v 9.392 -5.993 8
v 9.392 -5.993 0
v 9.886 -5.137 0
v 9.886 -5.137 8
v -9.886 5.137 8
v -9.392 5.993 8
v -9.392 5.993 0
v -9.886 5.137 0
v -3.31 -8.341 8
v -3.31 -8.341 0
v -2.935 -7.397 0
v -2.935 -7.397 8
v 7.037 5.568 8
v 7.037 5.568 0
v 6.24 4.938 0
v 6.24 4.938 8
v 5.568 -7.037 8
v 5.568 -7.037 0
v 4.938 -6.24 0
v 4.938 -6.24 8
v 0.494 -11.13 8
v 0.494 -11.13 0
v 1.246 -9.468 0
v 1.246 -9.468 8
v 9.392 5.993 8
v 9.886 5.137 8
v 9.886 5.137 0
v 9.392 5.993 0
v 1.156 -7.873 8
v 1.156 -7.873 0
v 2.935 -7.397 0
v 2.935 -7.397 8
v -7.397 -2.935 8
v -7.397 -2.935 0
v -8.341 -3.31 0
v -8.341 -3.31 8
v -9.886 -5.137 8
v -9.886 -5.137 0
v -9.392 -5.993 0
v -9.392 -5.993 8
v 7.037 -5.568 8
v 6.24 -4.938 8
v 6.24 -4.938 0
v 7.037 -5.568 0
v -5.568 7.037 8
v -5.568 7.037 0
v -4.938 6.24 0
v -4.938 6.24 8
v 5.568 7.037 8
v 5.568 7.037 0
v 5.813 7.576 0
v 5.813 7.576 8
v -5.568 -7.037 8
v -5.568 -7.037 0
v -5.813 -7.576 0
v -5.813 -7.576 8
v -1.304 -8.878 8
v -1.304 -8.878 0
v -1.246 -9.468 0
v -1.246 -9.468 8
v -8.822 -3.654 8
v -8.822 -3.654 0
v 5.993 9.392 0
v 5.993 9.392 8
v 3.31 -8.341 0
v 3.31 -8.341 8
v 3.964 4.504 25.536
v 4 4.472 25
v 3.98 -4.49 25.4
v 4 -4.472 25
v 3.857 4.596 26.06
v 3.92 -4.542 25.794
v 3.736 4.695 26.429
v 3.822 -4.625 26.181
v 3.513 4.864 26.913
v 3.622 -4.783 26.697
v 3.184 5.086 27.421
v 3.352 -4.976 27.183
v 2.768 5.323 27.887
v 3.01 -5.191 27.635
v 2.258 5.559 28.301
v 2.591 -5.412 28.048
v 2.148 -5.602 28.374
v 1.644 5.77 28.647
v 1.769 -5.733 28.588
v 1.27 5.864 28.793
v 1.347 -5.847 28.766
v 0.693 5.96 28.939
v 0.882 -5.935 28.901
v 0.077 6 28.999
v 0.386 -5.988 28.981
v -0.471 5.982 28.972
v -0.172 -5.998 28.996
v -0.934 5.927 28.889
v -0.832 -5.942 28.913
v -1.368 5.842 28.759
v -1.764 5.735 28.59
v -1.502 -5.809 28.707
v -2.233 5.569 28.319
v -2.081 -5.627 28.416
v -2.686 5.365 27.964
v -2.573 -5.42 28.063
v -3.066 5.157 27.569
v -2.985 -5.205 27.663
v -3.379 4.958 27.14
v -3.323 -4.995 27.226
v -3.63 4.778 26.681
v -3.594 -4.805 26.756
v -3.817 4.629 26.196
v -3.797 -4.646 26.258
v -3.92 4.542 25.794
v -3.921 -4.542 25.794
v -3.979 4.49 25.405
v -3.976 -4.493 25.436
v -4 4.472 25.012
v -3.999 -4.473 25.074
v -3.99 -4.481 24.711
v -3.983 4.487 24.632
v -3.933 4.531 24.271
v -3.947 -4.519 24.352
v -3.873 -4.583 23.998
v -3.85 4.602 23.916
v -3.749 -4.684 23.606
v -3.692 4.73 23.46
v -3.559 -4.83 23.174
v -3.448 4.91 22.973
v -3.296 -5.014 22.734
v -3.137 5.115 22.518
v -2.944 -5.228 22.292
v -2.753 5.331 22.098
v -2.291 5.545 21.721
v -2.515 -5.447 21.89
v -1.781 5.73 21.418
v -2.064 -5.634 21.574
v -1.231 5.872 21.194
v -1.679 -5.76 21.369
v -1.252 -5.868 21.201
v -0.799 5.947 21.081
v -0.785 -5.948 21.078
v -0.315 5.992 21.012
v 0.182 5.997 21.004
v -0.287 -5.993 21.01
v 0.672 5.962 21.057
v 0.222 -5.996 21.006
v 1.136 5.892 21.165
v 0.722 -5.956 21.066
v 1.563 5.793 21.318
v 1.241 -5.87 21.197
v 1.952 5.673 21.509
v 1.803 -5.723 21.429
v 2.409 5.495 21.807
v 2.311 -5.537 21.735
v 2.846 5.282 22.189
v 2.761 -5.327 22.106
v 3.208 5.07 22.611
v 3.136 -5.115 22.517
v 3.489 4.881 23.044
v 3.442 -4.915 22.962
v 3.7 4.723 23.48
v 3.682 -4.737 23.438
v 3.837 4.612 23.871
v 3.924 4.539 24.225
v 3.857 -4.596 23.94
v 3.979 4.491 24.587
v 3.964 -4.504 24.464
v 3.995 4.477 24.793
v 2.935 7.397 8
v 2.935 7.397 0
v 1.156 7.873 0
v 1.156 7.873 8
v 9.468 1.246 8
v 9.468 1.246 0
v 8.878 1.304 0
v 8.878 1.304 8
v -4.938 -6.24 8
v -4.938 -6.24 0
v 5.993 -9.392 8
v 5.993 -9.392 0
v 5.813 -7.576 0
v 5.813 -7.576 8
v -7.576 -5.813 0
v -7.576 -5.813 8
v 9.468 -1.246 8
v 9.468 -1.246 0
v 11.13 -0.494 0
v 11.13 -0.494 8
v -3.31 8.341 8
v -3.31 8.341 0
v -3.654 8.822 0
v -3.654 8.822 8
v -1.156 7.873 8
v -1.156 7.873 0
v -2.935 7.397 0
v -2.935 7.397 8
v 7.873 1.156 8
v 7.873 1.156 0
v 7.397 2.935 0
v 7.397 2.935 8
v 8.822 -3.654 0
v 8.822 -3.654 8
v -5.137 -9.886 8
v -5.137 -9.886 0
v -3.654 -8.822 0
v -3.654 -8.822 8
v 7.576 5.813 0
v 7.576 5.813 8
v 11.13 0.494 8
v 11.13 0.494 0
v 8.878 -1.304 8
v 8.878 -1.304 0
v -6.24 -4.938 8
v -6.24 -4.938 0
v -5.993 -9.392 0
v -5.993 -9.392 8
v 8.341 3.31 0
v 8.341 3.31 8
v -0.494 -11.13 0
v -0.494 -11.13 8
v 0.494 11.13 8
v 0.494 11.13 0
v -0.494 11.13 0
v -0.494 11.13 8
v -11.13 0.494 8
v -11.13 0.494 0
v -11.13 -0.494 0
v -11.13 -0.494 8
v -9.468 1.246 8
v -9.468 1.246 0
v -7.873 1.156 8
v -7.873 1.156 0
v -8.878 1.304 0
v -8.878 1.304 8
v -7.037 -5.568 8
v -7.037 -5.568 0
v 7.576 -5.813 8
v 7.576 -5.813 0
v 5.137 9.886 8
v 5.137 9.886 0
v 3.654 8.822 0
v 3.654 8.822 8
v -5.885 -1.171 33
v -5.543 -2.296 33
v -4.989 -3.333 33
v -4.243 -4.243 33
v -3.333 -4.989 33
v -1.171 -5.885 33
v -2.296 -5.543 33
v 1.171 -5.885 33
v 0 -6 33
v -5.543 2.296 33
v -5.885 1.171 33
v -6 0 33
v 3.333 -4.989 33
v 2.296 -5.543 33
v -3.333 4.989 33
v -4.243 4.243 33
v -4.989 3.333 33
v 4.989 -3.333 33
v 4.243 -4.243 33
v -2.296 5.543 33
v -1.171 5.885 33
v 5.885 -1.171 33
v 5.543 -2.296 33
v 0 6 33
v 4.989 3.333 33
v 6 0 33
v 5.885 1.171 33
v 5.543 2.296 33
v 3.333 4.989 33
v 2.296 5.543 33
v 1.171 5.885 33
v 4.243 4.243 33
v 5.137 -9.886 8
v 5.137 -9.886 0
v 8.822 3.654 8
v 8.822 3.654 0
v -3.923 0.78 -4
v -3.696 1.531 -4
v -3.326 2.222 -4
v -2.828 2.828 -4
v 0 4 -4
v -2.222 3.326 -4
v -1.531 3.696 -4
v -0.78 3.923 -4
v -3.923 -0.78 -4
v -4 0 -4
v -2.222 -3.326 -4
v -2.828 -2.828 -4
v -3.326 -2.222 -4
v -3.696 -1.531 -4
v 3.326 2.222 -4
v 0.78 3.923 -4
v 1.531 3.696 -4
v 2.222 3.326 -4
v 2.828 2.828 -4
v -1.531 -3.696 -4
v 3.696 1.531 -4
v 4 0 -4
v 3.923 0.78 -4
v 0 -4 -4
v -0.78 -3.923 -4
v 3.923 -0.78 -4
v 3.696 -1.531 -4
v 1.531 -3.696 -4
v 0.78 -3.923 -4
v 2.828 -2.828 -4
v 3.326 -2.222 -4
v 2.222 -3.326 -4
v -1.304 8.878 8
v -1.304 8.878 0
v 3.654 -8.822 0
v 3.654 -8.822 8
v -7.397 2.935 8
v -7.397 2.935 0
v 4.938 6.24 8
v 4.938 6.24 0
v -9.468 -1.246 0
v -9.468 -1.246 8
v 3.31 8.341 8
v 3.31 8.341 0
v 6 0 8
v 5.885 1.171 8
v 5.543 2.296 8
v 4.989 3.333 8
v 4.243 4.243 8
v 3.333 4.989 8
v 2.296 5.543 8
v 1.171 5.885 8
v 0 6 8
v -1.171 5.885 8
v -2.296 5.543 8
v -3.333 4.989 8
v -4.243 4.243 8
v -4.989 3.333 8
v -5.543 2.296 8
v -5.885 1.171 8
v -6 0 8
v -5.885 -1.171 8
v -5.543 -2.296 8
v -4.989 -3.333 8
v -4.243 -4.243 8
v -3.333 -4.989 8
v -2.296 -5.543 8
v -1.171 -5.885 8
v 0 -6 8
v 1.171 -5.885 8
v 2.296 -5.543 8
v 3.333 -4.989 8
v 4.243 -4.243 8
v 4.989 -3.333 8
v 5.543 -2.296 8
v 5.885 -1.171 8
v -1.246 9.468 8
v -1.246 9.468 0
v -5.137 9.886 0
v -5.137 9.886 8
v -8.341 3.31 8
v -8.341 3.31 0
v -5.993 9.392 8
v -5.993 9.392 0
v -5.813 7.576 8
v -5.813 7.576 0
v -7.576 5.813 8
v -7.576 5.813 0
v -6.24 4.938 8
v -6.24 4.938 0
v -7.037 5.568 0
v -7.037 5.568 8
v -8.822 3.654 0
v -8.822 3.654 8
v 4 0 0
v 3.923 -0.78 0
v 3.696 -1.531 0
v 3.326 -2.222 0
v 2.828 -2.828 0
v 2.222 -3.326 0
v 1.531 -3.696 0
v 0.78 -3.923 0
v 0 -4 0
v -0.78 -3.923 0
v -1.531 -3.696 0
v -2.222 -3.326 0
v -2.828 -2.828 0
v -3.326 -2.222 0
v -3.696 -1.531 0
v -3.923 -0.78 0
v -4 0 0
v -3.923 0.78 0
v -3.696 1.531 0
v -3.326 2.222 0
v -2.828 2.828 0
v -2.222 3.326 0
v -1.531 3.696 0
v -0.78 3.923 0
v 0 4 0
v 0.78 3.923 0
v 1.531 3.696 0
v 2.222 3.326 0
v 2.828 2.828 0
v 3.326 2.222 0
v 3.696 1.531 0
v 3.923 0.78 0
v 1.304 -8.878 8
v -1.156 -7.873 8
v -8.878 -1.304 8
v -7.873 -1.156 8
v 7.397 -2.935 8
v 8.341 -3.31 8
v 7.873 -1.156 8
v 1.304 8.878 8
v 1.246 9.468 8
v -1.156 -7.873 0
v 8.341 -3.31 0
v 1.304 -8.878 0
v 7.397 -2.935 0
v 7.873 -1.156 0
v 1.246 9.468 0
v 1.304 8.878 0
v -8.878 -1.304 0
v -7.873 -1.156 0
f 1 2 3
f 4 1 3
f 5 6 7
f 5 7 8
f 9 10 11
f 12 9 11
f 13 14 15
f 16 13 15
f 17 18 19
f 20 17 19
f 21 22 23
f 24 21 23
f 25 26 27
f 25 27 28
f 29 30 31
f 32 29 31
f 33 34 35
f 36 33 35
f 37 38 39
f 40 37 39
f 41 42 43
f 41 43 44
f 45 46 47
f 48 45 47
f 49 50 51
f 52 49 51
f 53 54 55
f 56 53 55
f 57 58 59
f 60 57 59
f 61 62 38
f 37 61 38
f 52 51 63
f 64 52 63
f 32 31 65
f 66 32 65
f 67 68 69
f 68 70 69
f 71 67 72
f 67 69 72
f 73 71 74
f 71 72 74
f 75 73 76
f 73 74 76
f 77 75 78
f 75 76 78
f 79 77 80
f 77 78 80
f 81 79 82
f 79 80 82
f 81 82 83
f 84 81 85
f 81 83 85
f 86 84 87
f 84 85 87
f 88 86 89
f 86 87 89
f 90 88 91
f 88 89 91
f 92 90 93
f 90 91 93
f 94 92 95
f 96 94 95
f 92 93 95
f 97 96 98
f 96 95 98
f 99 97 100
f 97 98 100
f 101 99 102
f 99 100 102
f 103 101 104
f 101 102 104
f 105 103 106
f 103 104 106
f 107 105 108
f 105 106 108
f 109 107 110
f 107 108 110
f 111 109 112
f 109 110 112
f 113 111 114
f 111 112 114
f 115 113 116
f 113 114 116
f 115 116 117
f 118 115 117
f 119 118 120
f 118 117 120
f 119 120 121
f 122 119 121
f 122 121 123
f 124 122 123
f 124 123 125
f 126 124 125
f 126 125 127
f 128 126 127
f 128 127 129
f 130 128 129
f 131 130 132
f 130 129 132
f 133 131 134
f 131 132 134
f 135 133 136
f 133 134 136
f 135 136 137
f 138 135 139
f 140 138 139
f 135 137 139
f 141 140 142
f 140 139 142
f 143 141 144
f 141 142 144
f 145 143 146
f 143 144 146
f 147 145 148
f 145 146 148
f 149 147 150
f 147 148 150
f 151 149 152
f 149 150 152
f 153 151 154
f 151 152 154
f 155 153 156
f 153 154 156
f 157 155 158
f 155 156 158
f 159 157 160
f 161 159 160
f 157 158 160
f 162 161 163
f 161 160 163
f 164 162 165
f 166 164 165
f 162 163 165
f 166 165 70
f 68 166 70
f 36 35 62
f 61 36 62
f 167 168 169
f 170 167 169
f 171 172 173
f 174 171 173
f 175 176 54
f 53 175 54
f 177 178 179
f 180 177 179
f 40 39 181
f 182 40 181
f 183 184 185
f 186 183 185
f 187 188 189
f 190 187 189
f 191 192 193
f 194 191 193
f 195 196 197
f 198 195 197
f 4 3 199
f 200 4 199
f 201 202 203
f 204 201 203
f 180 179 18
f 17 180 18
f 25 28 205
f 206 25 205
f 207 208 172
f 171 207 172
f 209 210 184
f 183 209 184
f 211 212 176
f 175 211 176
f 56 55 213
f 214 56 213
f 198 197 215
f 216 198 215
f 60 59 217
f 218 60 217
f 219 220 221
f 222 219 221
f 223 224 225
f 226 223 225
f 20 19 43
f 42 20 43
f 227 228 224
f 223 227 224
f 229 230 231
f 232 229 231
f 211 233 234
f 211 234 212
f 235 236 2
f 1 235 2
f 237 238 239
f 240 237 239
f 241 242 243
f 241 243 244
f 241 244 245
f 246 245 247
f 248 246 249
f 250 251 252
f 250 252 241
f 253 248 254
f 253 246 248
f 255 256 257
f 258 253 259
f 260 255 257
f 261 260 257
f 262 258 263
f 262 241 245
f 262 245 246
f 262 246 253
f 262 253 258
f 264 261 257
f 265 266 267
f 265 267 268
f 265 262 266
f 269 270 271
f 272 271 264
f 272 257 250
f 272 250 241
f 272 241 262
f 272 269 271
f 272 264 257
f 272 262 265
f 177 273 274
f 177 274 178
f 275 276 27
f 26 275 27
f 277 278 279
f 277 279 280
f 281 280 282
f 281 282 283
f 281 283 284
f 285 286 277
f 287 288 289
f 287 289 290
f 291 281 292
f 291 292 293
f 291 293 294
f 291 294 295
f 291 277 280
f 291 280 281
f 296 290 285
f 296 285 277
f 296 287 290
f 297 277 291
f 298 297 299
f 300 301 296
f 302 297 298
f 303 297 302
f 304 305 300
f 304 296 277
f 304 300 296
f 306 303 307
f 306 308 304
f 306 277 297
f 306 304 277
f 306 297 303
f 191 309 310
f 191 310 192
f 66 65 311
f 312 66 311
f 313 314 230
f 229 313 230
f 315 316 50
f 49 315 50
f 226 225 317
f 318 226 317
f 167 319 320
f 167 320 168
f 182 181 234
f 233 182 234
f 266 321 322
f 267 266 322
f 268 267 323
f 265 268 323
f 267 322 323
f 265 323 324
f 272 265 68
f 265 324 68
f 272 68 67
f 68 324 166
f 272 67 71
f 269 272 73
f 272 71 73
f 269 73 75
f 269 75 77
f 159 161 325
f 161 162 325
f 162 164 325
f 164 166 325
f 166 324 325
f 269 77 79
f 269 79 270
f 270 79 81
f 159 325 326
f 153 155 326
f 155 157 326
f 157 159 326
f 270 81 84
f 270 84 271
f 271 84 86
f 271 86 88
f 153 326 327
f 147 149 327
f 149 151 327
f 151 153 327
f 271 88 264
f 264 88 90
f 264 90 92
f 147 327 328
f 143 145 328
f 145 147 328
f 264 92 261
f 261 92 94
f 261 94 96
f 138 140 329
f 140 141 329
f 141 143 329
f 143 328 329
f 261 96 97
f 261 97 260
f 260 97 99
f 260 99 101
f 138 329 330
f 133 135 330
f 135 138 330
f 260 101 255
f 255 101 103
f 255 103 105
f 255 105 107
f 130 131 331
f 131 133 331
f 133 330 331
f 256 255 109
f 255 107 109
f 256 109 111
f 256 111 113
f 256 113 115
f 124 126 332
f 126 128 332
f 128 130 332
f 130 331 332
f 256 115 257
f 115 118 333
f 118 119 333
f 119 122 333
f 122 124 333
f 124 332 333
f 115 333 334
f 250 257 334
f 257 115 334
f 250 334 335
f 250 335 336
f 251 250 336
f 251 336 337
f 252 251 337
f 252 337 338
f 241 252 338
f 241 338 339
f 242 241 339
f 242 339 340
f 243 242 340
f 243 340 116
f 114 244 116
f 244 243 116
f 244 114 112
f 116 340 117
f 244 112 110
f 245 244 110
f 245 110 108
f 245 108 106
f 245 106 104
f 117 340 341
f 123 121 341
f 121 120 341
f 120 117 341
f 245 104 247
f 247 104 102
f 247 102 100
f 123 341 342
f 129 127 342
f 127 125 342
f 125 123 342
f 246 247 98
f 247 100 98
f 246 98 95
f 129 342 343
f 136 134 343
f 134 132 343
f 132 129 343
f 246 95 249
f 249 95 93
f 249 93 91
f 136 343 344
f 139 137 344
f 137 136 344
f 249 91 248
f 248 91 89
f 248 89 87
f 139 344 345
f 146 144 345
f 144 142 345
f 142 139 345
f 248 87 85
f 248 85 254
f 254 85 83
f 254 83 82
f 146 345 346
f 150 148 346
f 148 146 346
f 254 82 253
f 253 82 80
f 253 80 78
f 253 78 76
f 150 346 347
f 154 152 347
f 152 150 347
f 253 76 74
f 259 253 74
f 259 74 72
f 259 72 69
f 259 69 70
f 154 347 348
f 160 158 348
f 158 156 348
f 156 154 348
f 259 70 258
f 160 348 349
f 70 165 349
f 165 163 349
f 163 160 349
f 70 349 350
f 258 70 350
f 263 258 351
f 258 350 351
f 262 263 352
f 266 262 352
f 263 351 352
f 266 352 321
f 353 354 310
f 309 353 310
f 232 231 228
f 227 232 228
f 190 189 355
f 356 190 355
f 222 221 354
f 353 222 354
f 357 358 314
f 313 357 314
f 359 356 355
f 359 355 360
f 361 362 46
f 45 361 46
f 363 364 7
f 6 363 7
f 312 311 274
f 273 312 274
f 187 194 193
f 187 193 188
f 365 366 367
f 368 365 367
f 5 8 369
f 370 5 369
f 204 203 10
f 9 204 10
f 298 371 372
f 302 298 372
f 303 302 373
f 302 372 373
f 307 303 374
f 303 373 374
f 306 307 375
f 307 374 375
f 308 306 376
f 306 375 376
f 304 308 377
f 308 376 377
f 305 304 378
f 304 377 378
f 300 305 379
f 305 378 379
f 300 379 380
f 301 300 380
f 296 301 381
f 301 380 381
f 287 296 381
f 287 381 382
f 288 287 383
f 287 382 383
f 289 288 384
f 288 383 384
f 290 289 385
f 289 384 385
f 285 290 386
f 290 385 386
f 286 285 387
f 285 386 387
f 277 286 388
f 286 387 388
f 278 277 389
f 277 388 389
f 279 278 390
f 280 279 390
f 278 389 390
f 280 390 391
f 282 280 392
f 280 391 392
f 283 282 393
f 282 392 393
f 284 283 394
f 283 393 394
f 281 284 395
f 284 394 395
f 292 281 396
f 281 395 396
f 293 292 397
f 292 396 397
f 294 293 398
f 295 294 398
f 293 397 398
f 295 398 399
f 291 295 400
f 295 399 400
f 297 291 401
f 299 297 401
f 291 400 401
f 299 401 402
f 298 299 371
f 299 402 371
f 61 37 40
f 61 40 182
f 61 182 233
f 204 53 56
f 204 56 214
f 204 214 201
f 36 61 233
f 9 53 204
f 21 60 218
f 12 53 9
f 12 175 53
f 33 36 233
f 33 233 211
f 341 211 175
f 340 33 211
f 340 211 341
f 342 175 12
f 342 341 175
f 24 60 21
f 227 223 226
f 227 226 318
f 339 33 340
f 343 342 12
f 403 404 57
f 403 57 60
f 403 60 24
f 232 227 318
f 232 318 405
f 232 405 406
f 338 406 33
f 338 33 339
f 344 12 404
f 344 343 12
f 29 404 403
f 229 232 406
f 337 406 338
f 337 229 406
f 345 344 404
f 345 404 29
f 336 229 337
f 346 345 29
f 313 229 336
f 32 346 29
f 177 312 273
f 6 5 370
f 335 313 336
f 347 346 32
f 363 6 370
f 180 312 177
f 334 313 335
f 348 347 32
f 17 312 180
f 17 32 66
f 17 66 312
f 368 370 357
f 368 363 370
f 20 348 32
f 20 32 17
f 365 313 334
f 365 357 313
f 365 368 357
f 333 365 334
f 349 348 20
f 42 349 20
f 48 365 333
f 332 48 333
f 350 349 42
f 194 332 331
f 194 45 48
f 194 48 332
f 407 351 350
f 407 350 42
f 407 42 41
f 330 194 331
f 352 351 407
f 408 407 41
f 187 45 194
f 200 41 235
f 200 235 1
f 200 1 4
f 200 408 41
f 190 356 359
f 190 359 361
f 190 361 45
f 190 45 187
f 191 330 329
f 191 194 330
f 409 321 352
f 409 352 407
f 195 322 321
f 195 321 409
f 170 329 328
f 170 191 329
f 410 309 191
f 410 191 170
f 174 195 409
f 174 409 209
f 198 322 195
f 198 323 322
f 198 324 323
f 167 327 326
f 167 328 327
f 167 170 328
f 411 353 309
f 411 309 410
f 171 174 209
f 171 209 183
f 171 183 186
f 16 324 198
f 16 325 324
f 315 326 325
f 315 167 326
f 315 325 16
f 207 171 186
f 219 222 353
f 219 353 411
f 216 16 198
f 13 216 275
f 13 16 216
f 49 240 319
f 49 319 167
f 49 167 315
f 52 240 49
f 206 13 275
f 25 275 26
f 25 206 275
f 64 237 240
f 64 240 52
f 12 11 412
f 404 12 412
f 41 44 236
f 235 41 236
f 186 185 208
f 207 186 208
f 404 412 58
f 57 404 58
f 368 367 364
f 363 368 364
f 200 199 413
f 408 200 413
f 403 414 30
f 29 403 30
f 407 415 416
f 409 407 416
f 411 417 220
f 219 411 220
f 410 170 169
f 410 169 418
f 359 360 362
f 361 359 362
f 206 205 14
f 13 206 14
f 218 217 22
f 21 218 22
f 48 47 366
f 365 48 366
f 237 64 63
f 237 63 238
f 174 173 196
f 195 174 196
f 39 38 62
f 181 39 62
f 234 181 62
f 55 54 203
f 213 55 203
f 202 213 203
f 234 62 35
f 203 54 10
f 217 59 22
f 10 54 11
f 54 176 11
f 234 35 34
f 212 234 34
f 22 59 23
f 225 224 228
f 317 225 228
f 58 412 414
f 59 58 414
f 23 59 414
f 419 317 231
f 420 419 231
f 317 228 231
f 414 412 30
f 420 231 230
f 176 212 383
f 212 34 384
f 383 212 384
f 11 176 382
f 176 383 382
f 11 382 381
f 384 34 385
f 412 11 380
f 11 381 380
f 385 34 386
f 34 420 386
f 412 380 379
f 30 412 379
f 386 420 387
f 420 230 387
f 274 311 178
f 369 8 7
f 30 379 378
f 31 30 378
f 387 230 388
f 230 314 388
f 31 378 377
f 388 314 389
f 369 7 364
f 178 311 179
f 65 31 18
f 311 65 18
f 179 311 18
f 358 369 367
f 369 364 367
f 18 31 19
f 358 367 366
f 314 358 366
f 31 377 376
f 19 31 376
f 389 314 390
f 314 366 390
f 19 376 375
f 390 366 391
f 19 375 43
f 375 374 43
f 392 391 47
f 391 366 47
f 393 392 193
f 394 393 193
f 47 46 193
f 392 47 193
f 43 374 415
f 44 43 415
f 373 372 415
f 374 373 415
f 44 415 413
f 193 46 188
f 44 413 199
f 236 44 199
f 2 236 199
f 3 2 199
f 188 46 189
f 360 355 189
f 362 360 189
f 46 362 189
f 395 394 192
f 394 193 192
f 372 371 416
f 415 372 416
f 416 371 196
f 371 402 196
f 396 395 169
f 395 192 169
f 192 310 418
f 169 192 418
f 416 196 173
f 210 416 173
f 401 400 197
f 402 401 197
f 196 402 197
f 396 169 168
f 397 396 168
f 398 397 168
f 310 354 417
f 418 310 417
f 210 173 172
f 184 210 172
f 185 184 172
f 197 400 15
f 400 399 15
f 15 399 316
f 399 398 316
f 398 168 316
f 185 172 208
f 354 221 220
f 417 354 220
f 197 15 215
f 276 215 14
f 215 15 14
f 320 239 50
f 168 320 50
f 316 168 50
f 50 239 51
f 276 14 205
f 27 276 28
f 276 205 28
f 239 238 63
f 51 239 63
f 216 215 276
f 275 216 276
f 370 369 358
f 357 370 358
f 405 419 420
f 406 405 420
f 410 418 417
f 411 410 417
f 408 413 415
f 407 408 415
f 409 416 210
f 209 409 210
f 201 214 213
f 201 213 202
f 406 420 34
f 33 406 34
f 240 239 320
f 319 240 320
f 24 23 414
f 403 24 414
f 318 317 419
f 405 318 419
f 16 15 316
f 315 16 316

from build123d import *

# Parameters (mm, degrees)
F1_DEPTH = 8
F2_R     = 6
F3_DEPTH = 25
F4_R     = 4
F5_DEPTH = 4
F6_R     = 4
F7_DEPTH = 6


with BuildPart() as f1:
    # F0 (on Top) → F1 (new body)
    with BuildSketch(Plane.XY):
        Polygon((8.878189, 1.303729), (7.873311, 1.156166), (7.39657, 2.935387), (8.340604, 3.310035), (8.822399, 3.654358), (9.885736, 5.137187), (9.391802, 5.992704), (7.575968, 5.813244), (7.036875, 5.568157), (6.240405, 4.937924), (4.937924, 6.240405), (5.568157, 7.036876), (5.813244, 7.575967), (5.992704, 9.391803), (5.137187, 9.885737), (3.654357, 8.822399), (3.310035, 8.340604), (2.935388, 7.39657), (1.156166, 7.873311), (1.303728, 8.878189), (1.246434, 9.467602), (0.493934, 11.129891), (-0.493934, 11.129891), (-1.246434, 9.467602), (-1.303728, 8.878189), (-1.156166, 7.873311), (-2.935388, 7.39657), (-3.310035, 8.340604), (-3.654357, 8.822399), (-5.137187, 9.885737), (-5.992704, 9.391803), (-5.813244, 7.575967), (-5.568157, 7.036876), (-4.937924, 6.240405), (-6.240405, 4.937924), (-7.036875, 5.568157), (-7.575968, 5.813244), (-9.391802, 5.992704), (-9.885736, 5.137187), (-8.822399, 3.654358), (-8.340604, 3.310035), (-7.39657, 2.935387), (-7.873311, 1.156166), (-8.878189, 1.303729), (-9.467602, 1.246434), (-11.129891, 0.493934), (-11.129891, -0.493934), (-9.467602, -1.246434), (-8.878189, -1.303729), (-7.873311, -1.156165), (-7.39657, -2.935387), (-8.340604, -3.310035), (-8.822399, -3.654358), (-9.885736, -5.137186), (-9.391802, -5.992704), (-7.575968, -5.813244), (-7.036875, -5.568156), (-6.240405, -4.937924), (-4.937924, -6.240405), (-5.568157, -7.036876), (-5.813244, -7.575967), (-5.992704, -9.391803), (-5.137187, -9.885737), (-3.654357, -8.822399), (-3.310035, -8.340603), (-2.935388, -7.39657), (-1.156166, -7.873311), (-1.303728, -8.878188), (-1.246434, -9.467602), (-0.493934, -11.12989), (0.493934, -11.12989), (1.246434, -9.467602), (1.303728, -8.878188), (1.156166, -7.873311), (2.935388, -7.39657), (3.310035, -8.340603), (3.654357, -8.822399), (5.137187, -9.885737), (5.992704, -9.391803), (5.813244, -7.575967), (5.568157, -7.036876), (4.937924, -6.240405), (6.240405, -4.937924), (7.036875, -5.568156), (7.575968, -5.813244), (9.391802, -5.992704), (9.885736, -5.137186), (8.822399, -3.654358), (8.340604, -3.310035), (7.39657, -2.935387), (7.873311, -1.156165), (8.878189, -1.303729), (9.467602, -1.246434), (11.12989, -0.493934), (11.12989, 0.493934), (9.467602, 1.246434), align=None)
    extrude(amount=F1_DEPTH)

    # F2 (on face) → F3 (join)
    with BuildSketch(Plane.XY.offset(8)):
        Circle(F2_R)
    extrude(amount=F3_DEPTH)

    # F4 (on face) → F5 (join)
    with BuildSketch(Plane(origin=(0, 0, 0), x_dir=(1, 0, 0), z_dir=(0, 0, -1))):
        Circle(F4_R)
    extrude(amount=F5_DEPTH)

    # F6 (on Front) → F7 (cut, symmetric)
    with BuildSketch(Plane.XZ):
        with Locations((0, 25)):
            Circle(F6_R)
    extrude(amount=F7_DEPTH, both=True, mode=Mode.SUBTRACT)


solid = f1.part
